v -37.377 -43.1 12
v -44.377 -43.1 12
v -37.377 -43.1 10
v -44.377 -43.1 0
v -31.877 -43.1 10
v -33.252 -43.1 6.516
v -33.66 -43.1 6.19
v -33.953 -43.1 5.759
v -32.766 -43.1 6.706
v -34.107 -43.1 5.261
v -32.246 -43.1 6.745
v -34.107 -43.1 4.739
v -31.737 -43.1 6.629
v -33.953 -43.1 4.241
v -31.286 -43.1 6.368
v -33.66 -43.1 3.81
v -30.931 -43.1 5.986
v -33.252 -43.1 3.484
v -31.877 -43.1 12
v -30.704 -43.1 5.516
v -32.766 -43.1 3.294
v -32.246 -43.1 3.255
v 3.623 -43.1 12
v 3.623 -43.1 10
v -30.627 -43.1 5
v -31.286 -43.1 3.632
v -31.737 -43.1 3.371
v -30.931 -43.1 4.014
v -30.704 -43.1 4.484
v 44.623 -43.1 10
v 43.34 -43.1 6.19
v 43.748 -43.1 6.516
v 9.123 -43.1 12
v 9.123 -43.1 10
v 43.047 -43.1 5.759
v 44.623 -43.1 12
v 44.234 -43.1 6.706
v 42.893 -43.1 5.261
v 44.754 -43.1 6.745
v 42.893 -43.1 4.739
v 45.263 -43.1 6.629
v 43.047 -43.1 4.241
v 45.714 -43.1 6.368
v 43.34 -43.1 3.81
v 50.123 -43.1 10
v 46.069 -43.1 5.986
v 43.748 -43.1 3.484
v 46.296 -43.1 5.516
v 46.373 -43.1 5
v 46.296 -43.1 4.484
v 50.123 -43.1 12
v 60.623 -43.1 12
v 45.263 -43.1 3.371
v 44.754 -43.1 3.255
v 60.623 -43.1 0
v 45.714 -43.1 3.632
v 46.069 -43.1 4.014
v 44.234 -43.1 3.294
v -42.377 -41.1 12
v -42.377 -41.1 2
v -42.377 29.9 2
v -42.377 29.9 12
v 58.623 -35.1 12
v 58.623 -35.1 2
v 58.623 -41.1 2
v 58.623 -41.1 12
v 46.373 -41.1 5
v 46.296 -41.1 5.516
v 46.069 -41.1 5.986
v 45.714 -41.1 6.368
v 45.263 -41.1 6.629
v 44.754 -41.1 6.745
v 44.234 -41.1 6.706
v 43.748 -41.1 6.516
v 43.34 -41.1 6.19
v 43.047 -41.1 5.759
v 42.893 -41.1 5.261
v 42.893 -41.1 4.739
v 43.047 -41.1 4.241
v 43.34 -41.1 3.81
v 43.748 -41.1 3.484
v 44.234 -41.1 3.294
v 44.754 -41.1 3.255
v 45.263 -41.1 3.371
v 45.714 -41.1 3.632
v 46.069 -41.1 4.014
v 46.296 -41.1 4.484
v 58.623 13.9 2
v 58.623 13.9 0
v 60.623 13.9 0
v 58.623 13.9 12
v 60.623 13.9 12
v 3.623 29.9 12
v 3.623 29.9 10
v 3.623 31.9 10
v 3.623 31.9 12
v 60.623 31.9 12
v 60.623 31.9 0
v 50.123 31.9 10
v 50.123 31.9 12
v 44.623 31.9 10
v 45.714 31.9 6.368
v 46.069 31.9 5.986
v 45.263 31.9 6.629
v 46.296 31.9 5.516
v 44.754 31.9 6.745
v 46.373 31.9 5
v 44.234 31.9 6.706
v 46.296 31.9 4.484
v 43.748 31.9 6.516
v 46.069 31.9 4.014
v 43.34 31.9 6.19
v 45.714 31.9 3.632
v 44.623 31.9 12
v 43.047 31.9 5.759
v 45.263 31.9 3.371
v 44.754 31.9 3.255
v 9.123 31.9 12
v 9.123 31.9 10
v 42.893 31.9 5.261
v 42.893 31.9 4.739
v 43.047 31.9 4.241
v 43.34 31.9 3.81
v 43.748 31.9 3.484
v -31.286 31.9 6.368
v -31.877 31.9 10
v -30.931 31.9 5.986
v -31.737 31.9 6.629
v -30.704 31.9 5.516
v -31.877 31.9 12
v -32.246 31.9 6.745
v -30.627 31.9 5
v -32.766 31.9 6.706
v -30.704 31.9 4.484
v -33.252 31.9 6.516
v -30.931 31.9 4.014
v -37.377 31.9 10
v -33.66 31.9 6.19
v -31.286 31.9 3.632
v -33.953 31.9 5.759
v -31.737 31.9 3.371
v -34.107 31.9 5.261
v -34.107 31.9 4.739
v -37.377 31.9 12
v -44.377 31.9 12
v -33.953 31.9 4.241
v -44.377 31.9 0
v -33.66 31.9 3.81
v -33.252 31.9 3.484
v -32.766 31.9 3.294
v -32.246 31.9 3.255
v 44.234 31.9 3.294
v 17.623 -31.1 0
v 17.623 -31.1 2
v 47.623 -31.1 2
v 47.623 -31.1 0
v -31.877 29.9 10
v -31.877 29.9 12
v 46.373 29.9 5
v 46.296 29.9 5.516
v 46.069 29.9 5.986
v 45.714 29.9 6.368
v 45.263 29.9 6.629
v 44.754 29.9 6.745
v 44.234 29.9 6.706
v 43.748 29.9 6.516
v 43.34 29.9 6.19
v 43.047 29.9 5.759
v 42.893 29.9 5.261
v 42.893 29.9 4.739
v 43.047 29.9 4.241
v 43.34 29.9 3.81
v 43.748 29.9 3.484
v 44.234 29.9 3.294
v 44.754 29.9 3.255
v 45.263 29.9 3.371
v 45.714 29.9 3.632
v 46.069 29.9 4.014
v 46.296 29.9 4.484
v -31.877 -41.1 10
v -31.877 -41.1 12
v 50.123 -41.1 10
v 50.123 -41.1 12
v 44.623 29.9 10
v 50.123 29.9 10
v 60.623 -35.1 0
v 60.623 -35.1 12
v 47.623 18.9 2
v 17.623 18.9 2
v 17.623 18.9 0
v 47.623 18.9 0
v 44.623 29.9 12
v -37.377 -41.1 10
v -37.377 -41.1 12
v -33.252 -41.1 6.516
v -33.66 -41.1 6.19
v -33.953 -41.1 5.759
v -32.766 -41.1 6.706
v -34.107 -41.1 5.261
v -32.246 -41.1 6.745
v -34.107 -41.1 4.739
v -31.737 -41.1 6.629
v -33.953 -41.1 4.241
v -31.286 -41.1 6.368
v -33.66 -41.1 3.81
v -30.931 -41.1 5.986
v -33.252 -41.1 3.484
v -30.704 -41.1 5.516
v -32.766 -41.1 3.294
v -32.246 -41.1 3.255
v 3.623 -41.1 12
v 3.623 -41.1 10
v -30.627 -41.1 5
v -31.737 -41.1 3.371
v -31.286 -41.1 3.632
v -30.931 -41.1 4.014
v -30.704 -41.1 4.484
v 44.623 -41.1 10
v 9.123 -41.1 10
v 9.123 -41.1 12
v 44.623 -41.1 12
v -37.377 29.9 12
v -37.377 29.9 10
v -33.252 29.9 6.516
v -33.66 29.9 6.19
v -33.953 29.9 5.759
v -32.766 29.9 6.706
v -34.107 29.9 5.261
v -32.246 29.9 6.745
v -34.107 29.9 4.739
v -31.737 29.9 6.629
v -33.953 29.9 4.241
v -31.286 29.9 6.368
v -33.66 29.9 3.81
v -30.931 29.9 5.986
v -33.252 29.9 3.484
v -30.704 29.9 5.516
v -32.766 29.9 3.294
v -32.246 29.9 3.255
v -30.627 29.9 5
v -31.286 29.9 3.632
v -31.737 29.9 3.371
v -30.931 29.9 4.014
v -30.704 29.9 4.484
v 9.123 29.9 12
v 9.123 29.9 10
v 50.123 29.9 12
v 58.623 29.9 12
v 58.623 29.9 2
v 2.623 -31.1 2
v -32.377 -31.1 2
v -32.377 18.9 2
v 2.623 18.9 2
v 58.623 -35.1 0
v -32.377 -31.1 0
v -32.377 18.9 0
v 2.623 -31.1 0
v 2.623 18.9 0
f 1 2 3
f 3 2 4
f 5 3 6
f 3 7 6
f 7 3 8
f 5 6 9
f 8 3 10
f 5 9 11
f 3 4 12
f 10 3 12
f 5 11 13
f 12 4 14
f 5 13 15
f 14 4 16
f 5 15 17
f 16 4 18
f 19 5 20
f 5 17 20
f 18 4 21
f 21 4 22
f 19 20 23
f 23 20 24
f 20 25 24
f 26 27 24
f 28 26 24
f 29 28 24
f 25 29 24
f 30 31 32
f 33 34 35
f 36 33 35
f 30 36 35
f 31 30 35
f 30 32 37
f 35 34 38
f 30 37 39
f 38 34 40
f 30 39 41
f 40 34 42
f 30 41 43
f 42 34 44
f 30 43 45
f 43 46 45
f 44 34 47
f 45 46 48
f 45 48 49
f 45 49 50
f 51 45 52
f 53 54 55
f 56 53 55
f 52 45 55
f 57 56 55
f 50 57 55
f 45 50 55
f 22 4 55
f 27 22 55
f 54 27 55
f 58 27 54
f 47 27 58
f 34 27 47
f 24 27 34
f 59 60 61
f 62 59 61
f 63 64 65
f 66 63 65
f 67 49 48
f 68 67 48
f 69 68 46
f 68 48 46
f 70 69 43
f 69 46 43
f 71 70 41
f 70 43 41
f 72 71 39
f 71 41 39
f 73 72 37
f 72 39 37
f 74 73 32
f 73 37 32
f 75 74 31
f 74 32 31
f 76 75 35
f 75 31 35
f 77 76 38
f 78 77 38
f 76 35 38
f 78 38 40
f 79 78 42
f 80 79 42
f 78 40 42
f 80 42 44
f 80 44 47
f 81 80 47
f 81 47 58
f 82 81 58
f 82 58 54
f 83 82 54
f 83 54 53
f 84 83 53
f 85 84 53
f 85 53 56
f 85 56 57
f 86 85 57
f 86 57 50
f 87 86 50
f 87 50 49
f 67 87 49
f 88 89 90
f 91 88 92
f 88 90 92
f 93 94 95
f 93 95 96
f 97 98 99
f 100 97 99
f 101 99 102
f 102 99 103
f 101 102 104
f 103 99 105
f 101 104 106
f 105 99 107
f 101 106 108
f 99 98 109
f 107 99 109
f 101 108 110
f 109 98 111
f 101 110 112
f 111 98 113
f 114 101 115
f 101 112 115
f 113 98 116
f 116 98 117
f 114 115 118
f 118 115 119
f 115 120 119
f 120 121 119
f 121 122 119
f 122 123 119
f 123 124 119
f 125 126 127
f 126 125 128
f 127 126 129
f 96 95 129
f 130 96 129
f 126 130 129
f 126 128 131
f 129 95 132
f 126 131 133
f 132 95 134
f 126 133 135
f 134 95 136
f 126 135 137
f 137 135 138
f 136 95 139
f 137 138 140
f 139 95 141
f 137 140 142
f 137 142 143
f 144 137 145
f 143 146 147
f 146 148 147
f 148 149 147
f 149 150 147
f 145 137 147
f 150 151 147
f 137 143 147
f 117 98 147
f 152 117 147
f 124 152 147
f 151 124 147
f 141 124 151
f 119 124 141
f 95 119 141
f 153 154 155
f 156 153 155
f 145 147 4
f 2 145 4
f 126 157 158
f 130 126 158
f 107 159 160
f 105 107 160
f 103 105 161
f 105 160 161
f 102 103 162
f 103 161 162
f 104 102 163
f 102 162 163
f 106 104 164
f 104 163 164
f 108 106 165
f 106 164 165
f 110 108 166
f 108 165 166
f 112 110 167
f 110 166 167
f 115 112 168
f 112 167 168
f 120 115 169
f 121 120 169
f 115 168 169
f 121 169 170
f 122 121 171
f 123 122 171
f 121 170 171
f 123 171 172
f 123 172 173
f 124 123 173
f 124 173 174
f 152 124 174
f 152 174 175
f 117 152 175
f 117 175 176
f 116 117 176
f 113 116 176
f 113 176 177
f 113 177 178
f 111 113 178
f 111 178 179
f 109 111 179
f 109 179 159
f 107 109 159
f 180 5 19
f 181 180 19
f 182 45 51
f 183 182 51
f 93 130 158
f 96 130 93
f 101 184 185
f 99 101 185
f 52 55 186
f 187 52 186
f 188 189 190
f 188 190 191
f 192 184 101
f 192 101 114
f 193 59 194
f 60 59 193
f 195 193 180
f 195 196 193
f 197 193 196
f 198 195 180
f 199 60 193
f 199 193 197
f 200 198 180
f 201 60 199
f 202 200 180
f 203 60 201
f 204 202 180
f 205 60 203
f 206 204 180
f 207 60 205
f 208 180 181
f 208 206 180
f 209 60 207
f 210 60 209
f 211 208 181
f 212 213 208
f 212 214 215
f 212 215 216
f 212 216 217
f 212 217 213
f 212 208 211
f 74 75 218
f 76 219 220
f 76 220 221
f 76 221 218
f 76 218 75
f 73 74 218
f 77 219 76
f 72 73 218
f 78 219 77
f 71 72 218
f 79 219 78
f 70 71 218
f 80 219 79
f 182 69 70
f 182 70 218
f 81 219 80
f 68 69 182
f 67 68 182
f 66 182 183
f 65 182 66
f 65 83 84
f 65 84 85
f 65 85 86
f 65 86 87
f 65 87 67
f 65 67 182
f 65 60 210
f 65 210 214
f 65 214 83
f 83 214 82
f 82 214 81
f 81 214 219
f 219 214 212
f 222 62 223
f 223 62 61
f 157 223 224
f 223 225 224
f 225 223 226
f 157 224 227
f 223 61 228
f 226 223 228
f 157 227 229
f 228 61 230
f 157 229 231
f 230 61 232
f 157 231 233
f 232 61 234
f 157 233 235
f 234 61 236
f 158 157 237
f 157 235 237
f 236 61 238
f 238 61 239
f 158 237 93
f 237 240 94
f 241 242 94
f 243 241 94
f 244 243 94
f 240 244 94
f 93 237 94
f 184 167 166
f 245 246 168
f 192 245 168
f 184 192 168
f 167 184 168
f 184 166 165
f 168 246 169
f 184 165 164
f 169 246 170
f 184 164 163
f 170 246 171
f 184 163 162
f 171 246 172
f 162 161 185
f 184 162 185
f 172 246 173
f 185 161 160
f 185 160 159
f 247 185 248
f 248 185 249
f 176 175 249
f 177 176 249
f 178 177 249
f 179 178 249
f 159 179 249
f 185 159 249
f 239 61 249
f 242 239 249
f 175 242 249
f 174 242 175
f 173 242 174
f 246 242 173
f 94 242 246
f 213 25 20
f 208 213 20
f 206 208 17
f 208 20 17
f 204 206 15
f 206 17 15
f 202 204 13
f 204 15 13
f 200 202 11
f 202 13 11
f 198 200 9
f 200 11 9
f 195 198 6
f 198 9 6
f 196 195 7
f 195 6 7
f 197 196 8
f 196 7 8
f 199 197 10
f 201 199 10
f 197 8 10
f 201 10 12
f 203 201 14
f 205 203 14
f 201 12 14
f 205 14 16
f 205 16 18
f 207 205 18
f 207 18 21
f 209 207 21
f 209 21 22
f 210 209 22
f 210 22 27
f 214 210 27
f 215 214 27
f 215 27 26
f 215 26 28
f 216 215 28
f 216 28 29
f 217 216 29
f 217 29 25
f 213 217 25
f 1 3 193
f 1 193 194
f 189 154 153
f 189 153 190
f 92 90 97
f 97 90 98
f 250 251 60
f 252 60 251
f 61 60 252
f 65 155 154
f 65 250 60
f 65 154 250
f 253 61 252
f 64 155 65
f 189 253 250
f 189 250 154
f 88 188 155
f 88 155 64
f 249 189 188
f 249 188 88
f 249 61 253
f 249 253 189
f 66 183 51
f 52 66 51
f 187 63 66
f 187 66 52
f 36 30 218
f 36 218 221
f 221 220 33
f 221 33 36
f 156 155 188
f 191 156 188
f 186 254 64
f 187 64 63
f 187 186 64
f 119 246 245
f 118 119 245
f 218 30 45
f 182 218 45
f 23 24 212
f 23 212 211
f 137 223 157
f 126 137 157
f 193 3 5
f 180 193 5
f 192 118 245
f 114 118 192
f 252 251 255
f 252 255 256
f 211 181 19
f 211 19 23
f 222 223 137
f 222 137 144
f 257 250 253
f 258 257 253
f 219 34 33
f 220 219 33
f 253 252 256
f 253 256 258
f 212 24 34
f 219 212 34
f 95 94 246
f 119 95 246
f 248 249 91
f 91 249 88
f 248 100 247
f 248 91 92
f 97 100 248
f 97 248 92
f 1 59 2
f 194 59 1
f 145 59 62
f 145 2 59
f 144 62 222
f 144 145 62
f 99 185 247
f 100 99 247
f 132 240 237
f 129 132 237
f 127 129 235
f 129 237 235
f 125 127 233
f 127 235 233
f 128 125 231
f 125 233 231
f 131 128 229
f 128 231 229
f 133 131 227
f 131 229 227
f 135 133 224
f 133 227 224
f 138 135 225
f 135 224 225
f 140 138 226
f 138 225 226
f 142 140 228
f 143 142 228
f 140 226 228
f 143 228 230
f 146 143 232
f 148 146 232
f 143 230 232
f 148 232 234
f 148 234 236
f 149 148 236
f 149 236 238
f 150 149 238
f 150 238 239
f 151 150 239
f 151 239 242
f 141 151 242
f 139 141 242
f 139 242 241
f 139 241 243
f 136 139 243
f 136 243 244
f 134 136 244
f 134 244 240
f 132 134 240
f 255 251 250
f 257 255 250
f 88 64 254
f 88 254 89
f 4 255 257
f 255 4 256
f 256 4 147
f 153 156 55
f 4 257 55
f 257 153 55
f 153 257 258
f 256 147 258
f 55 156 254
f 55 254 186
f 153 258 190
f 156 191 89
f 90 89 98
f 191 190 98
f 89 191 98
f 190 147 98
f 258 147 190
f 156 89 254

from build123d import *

# Parameters (mm, degrees)
F0_W      = 101
F0_H      = 2
F1_DEPTH  = 12
F0_H_2    = 71
F2_DEPTH  = 2
F4_R      = 1.75
F5_DEPTH  = 100
F3_W      = 49
F3_H      = 12
F6_DEPTH  = 2
F7_W      = 35
F7_H      = 50
F7_W_2    = 30
F8_DEPTH  = 2
F9_W      = 5.5
F9_H      = 2
F10_DEPTH = 80


with BuildPart() as f1:
    # F0 (on Top) → F1 (new body)
    with BuildSketch(Plane.XY):
        Polygon((-42.37669, -41.099664), (-42.37669, 29.900336), (-42.37669, 31.900336), (-44.37669, 31.900336), (-44.37669, -43.099664), (-42.37669, -43.099664), align=None)
        with Locations((8.12331, 30.900336)):
            Rectangle(F0_W, F0_H)
        Polygon((58.62331, 31.900336), (58.62331, 29.900336), (58.62331, -41.099664), (58.62331, -43.099664), (60.62331, -43.099664), (60.62331, 31.900336), align=None)
        with Locations((8.12331, -42.099664)):
            Rectangle(F0_W, F0_H)
    extrude(amount=F1_DEPTH)

    # F0 (on Top) → F2 (join)
    with BuildSketch(Plane.XY):
        with Locations((8.12331, -5.599664)):
            Rectangle(F0_W, F0_H_2)
    extrude(amount=F2_DEPTH)

    # F4 (on face) → F5 (cut)
    with BuildSketch(Plane.XZ.offset(43.099664)):
        with Locations((44.623323, 5.000008)):
            Circle(F4_R)
        with Locations((-32.376677, 5.000008)):
            Circle(F4_R)
    extrude(amount=-F5_DEPTH, mode=Mode.SUBTRACT)

    # F3 (on face) → F6 (cut)
    with BuildSketch(Plane.YZ.offset(60.62331)):
        with Locations((-10.59967, 6)):
            Rectangle(F3_W, F3_H)
    extrude(amount=-F6_DEPTH, mode=Mode.SUBTRACT)

    # F7 (on face) → F8 (cut)
    with BuildSketch(Plane.XY.offset(2)):
        with Locations((-14.876692, -6.099655)):
            Rectangle(F7_W, F7_H)
        with Locations((32.623308, -6.099655)):
            Rectangle(F7_W_2, F7_H)
    extrude(amount=-F8_DEPTH, mode=Mode.SUBTRACT)

    # F9 (on face) → F10 (cut)
    with BuildSketch(Plane.XZ.offset(43.099664)):
        with Locations((-34.626723, 11.000004)):
            Rectangle(F9_W, F9_H)
        with Locations((6.373277, 11.000004)):
            Rectangle(F9_W, F9_H)
        with Locations((47.373277, 11.000004)):
            Rectangle(F9_W, F9_H)
    extrude(amount=-F10_DEPTH, mode=Mode.SUBTRACT)


solid = f1.part
